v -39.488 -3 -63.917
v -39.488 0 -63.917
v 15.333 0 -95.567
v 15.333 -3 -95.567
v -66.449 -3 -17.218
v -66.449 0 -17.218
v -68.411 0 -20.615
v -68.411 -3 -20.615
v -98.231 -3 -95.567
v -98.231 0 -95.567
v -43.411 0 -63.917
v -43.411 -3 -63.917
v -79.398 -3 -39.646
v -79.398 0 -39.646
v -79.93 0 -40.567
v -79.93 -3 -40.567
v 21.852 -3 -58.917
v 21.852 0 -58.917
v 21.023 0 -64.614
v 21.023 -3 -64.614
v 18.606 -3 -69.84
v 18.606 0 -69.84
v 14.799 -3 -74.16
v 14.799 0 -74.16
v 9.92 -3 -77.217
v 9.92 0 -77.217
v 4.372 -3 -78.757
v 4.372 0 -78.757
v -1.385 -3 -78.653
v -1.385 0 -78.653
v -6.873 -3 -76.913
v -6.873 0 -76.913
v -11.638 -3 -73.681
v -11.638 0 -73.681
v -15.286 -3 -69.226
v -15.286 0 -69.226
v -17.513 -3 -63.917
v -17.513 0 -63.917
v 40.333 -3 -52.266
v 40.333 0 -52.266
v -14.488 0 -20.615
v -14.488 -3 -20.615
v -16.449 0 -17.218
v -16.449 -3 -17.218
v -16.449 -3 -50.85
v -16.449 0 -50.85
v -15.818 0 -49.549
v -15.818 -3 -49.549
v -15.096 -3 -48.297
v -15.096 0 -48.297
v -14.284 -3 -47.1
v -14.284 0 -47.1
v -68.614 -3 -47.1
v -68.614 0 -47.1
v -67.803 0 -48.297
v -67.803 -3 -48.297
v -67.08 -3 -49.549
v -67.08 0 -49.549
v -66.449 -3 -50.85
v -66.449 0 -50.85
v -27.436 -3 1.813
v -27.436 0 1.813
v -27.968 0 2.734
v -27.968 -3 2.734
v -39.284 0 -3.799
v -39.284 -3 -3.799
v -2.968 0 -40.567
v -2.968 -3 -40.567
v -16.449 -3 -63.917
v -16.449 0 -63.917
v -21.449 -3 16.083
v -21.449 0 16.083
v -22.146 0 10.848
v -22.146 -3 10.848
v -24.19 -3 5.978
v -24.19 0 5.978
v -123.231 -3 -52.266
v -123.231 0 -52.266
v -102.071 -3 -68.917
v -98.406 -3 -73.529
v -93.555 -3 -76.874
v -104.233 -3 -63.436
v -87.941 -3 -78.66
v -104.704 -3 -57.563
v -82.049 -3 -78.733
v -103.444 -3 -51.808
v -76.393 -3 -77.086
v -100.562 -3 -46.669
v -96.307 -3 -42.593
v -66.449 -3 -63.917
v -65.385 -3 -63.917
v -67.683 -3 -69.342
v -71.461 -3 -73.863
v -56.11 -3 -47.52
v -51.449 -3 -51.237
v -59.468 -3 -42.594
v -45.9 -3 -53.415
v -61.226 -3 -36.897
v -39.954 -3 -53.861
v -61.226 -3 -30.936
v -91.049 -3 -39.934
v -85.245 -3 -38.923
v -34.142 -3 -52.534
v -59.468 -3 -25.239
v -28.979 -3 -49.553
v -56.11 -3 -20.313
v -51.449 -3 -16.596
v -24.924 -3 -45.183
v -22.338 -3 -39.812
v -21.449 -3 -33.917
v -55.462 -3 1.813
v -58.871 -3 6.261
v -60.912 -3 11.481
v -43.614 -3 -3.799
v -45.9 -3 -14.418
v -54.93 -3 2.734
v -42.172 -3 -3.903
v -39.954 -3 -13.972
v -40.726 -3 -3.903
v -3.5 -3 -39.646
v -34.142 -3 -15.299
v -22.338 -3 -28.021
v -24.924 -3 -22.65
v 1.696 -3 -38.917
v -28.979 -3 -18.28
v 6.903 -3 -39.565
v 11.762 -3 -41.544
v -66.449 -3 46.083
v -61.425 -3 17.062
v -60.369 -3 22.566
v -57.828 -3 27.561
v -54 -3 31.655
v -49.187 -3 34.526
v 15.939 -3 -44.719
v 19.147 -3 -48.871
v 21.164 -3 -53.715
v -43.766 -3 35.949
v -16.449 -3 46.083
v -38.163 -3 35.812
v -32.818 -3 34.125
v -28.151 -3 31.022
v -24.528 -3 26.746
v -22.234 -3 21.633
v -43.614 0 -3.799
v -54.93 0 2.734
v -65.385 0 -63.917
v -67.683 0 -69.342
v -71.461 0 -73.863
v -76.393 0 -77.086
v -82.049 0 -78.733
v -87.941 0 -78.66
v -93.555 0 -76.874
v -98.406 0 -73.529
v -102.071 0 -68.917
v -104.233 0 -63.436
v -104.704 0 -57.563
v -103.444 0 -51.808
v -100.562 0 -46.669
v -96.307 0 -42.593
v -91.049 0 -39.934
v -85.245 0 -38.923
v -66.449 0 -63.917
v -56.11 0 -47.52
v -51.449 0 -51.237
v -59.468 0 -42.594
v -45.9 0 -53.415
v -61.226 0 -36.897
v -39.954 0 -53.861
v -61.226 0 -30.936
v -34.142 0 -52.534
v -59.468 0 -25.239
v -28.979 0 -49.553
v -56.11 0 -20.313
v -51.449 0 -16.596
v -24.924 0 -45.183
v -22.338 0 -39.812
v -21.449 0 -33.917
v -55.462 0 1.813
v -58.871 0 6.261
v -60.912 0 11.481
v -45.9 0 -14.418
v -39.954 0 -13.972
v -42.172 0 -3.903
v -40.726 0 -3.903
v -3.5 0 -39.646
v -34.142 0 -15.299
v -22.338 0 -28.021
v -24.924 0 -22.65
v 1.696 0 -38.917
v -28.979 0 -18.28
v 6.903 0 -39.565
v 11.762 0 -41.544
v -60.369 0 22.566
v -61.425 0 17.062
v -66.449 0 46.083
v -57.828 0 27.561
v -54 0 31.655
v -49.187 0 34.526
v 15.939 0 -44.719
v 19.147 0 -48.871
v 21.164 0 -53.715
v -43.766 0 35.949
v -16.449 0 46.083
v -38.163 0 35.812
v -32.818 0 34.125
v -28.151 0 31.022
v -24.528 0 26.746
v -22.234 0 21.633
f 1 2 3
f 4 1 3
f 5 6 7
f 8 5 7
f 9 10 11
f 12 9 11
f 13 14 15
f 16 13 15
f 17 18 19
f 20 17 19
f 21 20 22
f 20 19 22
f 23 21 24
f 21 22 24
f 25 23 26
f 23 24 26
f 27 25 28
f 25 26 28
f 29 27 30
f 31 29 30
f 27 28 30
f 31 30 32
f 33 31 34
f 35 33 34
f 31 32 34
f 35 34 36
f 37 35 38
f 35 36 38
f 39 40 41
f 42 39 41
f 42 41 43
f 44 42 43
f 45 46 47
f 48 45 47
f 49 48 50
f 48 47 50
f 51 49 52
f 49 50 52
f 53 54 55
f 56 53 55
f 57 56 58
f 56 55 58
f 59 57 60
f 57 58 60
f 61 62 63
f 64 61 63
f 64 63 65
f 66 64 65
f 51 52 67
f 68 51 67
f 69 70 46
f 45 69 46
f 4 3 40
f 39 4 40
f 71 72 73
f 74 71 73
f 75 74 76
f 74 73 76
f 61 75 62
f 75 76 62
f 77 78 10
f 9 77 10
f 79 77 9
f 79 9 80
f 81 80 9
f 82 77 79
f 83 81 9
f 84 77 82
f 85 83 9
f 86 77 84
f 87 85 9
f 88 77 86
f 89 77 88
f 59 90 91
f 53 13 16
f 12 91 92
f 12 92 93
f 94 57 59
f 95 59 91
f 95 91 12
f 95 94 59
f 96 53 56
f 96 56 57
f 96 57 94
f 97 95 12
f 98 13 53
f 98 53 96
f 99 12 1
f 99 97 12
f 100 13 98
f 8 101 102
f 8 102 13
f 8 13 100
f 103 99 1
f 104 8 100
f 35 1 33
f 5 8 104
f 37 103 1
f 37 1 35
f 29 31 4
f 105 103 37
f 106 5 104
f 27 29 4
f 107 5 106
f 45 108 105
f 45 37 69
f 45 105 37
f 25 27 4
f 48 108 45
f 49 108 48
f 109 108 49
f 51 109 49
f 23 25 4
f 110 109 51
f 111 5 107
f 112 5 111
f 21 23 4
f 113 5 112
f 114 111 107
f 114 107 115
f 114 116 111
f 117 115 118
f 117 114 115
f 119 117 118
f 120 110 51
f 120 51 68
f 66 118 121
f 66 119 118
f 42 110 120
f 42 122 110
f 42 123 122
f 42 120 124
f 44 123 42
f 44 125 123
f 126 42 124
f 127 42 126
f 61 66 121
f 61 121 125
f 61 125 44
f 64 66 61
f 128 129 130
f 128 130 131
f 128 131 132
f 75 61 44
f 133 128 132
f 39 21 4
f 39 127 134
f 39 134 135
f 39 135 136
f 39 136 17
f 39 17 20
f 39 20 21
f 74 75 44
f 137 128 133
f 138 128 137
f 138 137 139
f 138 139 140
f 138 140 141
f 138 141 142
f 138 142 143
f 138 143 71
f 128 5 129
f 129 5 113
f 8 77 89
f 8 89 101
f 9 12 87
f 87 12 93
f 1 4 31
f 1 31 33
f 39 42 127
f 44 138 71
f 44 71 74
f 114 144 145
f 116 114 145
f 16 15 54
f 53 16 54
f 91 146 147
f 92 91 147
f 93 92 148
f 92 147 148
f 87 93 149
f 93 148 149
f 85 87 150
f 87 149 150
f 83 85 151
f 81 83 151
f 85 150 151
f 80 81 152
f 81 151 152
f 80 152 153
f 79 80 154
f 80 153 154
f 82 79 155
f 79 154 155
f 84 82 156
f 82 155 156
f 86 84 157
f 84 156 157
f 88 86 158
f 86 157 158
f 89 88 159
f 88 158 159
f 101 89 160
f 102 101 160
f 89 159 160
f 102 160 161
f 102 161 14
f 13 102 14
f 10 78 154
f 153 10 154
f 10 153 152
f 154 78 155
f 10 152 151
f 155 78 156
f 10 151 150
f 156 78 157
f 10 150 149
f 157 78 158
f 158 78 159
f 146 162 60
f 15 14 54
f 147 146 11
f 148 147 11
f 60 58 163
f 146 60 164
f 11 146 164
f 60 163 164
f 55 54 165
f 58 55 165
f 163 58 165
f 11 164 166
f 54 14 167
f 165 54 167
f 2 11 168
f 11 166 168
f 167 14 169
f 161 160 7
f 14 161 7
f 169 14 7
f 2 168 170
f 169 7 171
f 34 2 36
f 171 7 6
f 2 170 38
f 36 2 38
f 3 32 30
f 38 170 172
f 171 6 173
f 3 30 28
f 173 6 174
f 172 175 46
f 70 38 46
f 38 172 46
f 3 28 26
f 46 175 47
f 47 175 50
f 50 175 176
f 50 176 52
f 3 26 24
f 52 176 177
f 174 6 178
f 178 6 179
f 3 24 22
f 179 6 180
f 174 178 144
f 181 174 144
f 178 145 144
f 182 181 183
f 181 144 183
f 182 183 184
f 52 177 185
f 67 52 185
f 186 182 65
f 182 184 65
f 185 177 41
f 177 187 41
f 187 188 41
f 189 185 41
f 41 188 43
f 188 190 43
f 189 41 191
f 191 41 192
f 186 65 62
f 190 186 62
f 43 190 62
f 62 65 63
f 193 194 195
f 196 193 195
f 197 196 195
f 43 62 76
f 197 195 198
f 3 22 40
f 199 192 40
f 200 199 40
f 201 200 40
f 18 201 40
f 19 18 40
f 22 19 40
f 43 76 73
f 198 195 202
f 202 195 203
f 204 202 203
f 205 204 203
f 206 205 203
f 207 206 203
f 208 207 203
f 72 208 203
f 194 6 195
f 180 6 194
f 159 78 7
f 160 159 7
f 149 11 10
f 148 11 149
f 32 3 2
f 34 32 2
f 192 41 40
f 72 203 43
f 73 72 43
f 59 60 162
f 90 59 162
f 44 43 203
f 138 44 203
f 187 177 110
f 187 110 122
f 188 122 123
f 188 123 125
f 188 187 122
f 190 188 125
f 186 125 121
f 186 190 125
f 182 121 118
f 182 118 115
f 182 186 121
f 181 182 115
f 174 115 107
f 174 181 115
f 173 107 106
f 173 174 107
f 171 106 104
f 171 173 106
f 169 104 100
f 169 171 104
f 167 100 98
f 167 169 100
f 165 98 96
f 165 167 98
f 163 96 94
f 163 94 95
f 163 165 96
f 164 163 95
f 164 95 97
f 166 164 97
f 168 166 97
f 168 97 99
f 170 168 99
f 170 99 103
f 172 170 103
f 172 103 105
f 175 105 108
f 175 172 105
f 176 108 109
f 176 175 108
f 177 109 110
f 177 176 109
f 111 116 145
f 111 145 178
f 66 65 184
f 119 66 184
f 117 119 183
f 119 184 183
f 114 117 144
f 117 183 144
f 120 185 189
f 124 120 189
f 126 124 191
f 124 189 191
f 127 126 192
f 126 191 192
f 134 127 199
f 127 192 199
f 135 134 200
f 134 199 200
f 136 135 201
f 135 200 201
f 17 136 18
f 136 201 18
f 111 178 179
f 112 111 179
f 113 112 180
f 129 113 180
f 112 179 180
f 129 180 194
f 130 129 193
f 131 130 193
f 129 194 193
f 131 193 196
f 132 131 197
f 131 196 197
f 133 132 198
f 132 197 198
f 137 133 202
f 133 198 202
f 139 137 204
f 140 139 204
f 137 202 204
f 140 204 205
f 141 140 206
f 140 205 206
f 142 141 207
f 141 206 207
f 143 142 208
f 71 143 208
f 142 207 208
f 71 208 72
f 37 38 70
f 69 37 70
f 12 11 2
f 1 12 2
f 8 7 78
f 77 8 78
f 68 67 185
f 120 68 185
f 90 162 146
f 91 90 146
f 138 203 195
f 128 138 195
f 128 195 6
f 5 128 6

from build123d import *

# Parameters (mm, degrees)
F0_R     = 20
F1_DEPTH = 3


with BuildPart() as f1:
    # F0 (on Front) → F1 (new body)
    with BuildSketch(Plane.XZ):
        with BuildLine():
            ThreePointArc((-39.2839784876, -3.7990042795), (-32.8873709815, -1.9913052768), (-27.4364980034, 1.8129485328))
            Line((-27.4364980034, 1.8129485328), (-27.9683212743, 2.7340934586))
            Line((-27.9683212743, 2.7340934586), (-39.2839784876, -3.7990042795))
        make_face()
        with BuildLine():
            Line((-2.9683212743, -40.5671767306), (-3.5001445452, -39.6460318047))
            ThreePointArc((-3.5001445452, -39.6460318047), (-9.5201614758, -42.4644993718), (-14.2839784876, -47.1002744687))
            Line((-14.2839784876, -47.1002744687), (-2.9683212743, -40.5671767306))
        make_face()
        with BuildLine():
            Line((-16.4490833879, -17.2178118252), (-27.4364980034, 1.8129485328))
            ThreePointArc((-27.4364980034, 1.8129485328), (-32.8873709815, -1.9913052768), (-39.2839784876, -3.7990042795))
            Line((-39.2839784876, -3.7990042795), (-41.4490833879, -5.0490281765))
            Line((-41.4490833879, -5.0490281765), (-16.4490833879, -19.4827849062))
            Line((-16.4490833879, -19.4827849062), (-16.4490833879, -17.2178118252))
        make_face()
        with BuildLine():
            Line((-16.4490833879, -50.8503461597), (-16.4490833879, -48.3502983657))
            Line((-16.4490833879, -48.3502983657), (-41.4490833879, -62.7840550955))
            Line((-41.4490833879, -62.7840550955), (-39.4875591608, -63.916541636))
            Line((-39.4875591608, -63.916541636), (-17.5127299297, -63.916541636))
            ThreePointArc((-17.5127299297, -63.916541636), (-18.0818738821, -57.2938202594), (-16.4490833879, -50.8503461597))
        make_face()
        with BuildLine():
            Line((-14.2839784876, -47.1002744687), (-16.4490833879, -48.3502983657))
            Line((-16.4490833879, -48.3502983657), (-16.4490833879, -50.8503461597))
            ThreePointArc((-16.4490833879, -50.8503461597), (-15.4683212743, -48.916541636), (-14.2839784876, -47.1002744687))
        make_face()
        with BuildLine():
            Line((-14.4875591608, -20.6152714468), (-16.4490833879, -19.4827849062))
            Line((-16.4490833879, -19.4827849062), (-16.4490833879, -48.3502983657))
            Line((-16.4490833879, -48.3502983657), (-14.2839784876, -47.1002744687))
            ThreePointArc((-14.2839784876, -47.1002744687), (-9.5201614758, -42.4644993718), (-3.5001445452, -39.6460318047))
            Line((-3.5001445452, -39.6460318047), (-14.4875591608, -20.6152714468))
        make_face()
        with BuildLine():
            Line((-16.4490833879, -63.916541636), (-16.4490833879, -50.8503461597))
            ThreePointArc((-16.4490833879, -50.8503461597), (-18.0818738821, -57.2938202594), (-17.5127299297, -63.916541636))
            Line((-17.5127299297, -63.916541636), (-16.4490833879, -63.916541636))
        make_face()
        Polygon((-14.4875591608, -20.6152714468), (-16.4490833879, -17.2178118252), (-16.4490833879, -19.4827849062), align=None)
        with BuildLine():
            ThreePointArc((-55.4616687723, 1.8129485328), (-49.186921985, 34.5259596544), (-21.4490833879, 16.083458364))
            ThreePointArc((-21.4490833879, 16.083458364), (-23.0065820975, 8.3456197669), (-27.4364980034, 1.8129485328))
            Line((-27.4364980034, 1.8129485328), (-16.4490833879, -17.2178118252))
            Line((-16.4490833879, -17.2178118252), (-16.4490833879, 46.083458364))
            Line((-16.4490833879, 46.083458364), (-66.4490833879, 46.083458364))
            Line((-66.4490833879, 46.083458364), (-66.4490833879, -17.2178118252))
            Line((-66.4490833879, -17.2178118252), (-55.4616687723, 1.8129485328))
        make_face()
        with BuildLine():
            Line((-79.3980222305, -39.6460318047), (-68.4106076149, -20.6152714468))
            Line((-68.4106076149, -20.6152714468), (-123.2311156906, -52.2659065414))
            Line((-123.2311156906, -52.2659065414), (-98.2311156906, -95.5671767306))
            Line((-98.2311156906, -95.5671767306), (-43.4106076149, -63.916541636))
            Line((-43.4106076149, -63.916541636), (-65.385436846, -63.916541636))
            ThreePointArc((-65.385436846, -63.916541636), (-102.0708616528, -68.916541636), (-79.3980222305, -39.6460318047))
        make_face()
        with BuildLine():
            Line((40.3329489149, -52.2659065414), (-14.4875591608, -20.6152714468))
            Line((-14.4875591608, -20.6152714468), (-3.5001445452, -39.6460318047))
            ThreePointArc((-3.5001445452, -39.6460318047), (13.9549421296, -42.9941261953), (21.8521868014, -58.916541636))
            ThreePointArc((21.8521868014, -58.916541636), (4.372272651, -78.7571355613), (-17.5127299297, -63.916541636))
            Line((-17.5127299297, -63.916541636), (-39.4875591608, -63.916541636))
            Line((-39.4875591608, -63.916541636), (15.3329489149, -95.5671767306))
            Line((15.3329489149, -95.5671767306), (40.3329489149, -52.2659065414))
        make_face()
        with BuildLine():
            Line((-41.4490833879, -62.7840550955), (-66.4490833879, -48.3502983657))
            Line((-66.4490833879, -48.3502983657), (-66.4490833879, -50.8503461597))
            ThreePointArc((-66.4490833879, -50.8503461597), (-65.1796432708, -54.7949766289), (-64.7503535771, -58.916541636))
            ThreePointArc((-64.7503535771, -58.916541636), (-64.9097596517, -61.4366274856), (-65.385436846, -63.916541636))
            Line((-65.385436846, -63.916541636), (-43.4106076149, -63.916541636))
            Line((-43.4106076149, -63.916541636), (-41.4490833879, -62.7840550955))
        make_face()
        with BuildLine():
            Line((-66.4490833879, -48.3502983657), (-66.4490833879, -19.4827849062))
            Line((-66.4490833879, -19.4827849062), (-68.4106076149, -20.6152714468))
            Line((-68.4106076149, -20.6152714468), (-79.3980222305, -39.6460318047))
            ThreePointArc((-79.3980222305, -39.6460318047), (-73.3780052999, -42.4644993718), (-68.6141882881, -47.1002744687))
            Line((-68.6141882881, -47.1002744687), (-66.4490833879, -48.3502983657))
        make_face()
        with BuildLine():
            ThreePointArc((-43.6141882881, -3.7990042795), (-50.0107957942, -1.9913052768), (-55.4616687723, 1.8129485328))
            Line((-55.4616687723, 1.8129485328), (-66.4490833879, -17.2178118252))
            Line((-66.4490833879, -17.2178118252), (-66.4490833879, -19.4827849062))
            Line((-66.4490833879, -19.4827849062), (-41.4490833879, -5.0490281765))
            Line((-41.4490833879, -5.0490281765), (-43.6141882881, -3.7990042795))
        make_face()
        Polygon((-16.4490833879, -19.4827849062), (-41.4490833879, -5.0490281765), (-66.4490833879, -19.4827849062), (-66.4490833879, -48.3502983657), (-41.4490833879, -62.7840550955), (-16.4490833879, -48.3502983657), align=None)
        with Locations((-41.4490833879, -33.916541636)):
            Circle(F0_R, mode=Mode.SUBTRACT)
        with BuildLine():
            ThreePointArc((-64.7503535771, -58.916541636), (-65.1796432708, -54.7949766289), (-66.4490833879, -50.8503461597))
            Line((-66.4490833879, -50.8503461597), (-66.4490833879, -63.916541636))
            Line((-66.4490833879, -63.916541636), (-65.385436846, -63.916541636))
            ThreePointArc((-65.385436846, -63.916541636), (-64.9097596517, -61.4366274856), (-64.7503535771, -58.916541636))
        make_face()
        Polygon((-39.4875591608, -63.916541636), (-41.4490833879, -62.7840550955), (-43.4106076149, -63.916541636), align=None)
        Polygon((-66.4490833879, -19.4827849062), (-66.4490833879, -17.2178118252), (-68.4106076149, -20.6152714468), align=None)
        with BuildLine():
            ThreePointArc((-68.6141882881, -47.1002744687), (-73.3780052999, -42.4644993718), (-79.3980222305, -39.6460318047))
            Line((-79.3980222305, -39.6460318047), (-79.9298455014, -40.5671767306))
            Line((-79.9298455014, -40.5671767306), (-68.6141882881, -47.1002744687))
        make_face()
        with BuildLine():
            ThreePointArc((-39.2839784876, -3.7990042795), (-41.4490833879, -3.916541636), (-43.6141882881, -3.7990042795))
            Line((-43.6141882881, -3.7990042795), (-41.4490833879, -5.0490281765))
            Line((-41.4490833879, -5.0490281765), (-39.2839784876, -3.7990042795))
        make_face()
        with BuildLine():
            Line((-66.4490833879, -50.8503461597), (-66.4490833879, -48.3502983657))
            Line((-66.4490833879, -48.3502983657), (-68.6141882881, -47.1002744687))
            ThreePointArc((-68.6141882881, -47.1002744687), (-67.4298455014, -48.916541636), (-66.4490833879, -50.8503461597))
        make_face()
        with BuildLine():
            Line((-54.9298455014, 2.7340934586), (-55.4616687723, 1.8129485328))
            ThreePointArc((-55.4616687723, 1.8129485328), (-50.0107957942, -1.9913052768), (-43.6141882881, -3.7990042795))
            Line((-43.6141882881, -3.7990042795), (-54.9298455014, 2.7340934586))
        make_face()
    extrude(amount=F1_DEPTH)


solid = f1.part
